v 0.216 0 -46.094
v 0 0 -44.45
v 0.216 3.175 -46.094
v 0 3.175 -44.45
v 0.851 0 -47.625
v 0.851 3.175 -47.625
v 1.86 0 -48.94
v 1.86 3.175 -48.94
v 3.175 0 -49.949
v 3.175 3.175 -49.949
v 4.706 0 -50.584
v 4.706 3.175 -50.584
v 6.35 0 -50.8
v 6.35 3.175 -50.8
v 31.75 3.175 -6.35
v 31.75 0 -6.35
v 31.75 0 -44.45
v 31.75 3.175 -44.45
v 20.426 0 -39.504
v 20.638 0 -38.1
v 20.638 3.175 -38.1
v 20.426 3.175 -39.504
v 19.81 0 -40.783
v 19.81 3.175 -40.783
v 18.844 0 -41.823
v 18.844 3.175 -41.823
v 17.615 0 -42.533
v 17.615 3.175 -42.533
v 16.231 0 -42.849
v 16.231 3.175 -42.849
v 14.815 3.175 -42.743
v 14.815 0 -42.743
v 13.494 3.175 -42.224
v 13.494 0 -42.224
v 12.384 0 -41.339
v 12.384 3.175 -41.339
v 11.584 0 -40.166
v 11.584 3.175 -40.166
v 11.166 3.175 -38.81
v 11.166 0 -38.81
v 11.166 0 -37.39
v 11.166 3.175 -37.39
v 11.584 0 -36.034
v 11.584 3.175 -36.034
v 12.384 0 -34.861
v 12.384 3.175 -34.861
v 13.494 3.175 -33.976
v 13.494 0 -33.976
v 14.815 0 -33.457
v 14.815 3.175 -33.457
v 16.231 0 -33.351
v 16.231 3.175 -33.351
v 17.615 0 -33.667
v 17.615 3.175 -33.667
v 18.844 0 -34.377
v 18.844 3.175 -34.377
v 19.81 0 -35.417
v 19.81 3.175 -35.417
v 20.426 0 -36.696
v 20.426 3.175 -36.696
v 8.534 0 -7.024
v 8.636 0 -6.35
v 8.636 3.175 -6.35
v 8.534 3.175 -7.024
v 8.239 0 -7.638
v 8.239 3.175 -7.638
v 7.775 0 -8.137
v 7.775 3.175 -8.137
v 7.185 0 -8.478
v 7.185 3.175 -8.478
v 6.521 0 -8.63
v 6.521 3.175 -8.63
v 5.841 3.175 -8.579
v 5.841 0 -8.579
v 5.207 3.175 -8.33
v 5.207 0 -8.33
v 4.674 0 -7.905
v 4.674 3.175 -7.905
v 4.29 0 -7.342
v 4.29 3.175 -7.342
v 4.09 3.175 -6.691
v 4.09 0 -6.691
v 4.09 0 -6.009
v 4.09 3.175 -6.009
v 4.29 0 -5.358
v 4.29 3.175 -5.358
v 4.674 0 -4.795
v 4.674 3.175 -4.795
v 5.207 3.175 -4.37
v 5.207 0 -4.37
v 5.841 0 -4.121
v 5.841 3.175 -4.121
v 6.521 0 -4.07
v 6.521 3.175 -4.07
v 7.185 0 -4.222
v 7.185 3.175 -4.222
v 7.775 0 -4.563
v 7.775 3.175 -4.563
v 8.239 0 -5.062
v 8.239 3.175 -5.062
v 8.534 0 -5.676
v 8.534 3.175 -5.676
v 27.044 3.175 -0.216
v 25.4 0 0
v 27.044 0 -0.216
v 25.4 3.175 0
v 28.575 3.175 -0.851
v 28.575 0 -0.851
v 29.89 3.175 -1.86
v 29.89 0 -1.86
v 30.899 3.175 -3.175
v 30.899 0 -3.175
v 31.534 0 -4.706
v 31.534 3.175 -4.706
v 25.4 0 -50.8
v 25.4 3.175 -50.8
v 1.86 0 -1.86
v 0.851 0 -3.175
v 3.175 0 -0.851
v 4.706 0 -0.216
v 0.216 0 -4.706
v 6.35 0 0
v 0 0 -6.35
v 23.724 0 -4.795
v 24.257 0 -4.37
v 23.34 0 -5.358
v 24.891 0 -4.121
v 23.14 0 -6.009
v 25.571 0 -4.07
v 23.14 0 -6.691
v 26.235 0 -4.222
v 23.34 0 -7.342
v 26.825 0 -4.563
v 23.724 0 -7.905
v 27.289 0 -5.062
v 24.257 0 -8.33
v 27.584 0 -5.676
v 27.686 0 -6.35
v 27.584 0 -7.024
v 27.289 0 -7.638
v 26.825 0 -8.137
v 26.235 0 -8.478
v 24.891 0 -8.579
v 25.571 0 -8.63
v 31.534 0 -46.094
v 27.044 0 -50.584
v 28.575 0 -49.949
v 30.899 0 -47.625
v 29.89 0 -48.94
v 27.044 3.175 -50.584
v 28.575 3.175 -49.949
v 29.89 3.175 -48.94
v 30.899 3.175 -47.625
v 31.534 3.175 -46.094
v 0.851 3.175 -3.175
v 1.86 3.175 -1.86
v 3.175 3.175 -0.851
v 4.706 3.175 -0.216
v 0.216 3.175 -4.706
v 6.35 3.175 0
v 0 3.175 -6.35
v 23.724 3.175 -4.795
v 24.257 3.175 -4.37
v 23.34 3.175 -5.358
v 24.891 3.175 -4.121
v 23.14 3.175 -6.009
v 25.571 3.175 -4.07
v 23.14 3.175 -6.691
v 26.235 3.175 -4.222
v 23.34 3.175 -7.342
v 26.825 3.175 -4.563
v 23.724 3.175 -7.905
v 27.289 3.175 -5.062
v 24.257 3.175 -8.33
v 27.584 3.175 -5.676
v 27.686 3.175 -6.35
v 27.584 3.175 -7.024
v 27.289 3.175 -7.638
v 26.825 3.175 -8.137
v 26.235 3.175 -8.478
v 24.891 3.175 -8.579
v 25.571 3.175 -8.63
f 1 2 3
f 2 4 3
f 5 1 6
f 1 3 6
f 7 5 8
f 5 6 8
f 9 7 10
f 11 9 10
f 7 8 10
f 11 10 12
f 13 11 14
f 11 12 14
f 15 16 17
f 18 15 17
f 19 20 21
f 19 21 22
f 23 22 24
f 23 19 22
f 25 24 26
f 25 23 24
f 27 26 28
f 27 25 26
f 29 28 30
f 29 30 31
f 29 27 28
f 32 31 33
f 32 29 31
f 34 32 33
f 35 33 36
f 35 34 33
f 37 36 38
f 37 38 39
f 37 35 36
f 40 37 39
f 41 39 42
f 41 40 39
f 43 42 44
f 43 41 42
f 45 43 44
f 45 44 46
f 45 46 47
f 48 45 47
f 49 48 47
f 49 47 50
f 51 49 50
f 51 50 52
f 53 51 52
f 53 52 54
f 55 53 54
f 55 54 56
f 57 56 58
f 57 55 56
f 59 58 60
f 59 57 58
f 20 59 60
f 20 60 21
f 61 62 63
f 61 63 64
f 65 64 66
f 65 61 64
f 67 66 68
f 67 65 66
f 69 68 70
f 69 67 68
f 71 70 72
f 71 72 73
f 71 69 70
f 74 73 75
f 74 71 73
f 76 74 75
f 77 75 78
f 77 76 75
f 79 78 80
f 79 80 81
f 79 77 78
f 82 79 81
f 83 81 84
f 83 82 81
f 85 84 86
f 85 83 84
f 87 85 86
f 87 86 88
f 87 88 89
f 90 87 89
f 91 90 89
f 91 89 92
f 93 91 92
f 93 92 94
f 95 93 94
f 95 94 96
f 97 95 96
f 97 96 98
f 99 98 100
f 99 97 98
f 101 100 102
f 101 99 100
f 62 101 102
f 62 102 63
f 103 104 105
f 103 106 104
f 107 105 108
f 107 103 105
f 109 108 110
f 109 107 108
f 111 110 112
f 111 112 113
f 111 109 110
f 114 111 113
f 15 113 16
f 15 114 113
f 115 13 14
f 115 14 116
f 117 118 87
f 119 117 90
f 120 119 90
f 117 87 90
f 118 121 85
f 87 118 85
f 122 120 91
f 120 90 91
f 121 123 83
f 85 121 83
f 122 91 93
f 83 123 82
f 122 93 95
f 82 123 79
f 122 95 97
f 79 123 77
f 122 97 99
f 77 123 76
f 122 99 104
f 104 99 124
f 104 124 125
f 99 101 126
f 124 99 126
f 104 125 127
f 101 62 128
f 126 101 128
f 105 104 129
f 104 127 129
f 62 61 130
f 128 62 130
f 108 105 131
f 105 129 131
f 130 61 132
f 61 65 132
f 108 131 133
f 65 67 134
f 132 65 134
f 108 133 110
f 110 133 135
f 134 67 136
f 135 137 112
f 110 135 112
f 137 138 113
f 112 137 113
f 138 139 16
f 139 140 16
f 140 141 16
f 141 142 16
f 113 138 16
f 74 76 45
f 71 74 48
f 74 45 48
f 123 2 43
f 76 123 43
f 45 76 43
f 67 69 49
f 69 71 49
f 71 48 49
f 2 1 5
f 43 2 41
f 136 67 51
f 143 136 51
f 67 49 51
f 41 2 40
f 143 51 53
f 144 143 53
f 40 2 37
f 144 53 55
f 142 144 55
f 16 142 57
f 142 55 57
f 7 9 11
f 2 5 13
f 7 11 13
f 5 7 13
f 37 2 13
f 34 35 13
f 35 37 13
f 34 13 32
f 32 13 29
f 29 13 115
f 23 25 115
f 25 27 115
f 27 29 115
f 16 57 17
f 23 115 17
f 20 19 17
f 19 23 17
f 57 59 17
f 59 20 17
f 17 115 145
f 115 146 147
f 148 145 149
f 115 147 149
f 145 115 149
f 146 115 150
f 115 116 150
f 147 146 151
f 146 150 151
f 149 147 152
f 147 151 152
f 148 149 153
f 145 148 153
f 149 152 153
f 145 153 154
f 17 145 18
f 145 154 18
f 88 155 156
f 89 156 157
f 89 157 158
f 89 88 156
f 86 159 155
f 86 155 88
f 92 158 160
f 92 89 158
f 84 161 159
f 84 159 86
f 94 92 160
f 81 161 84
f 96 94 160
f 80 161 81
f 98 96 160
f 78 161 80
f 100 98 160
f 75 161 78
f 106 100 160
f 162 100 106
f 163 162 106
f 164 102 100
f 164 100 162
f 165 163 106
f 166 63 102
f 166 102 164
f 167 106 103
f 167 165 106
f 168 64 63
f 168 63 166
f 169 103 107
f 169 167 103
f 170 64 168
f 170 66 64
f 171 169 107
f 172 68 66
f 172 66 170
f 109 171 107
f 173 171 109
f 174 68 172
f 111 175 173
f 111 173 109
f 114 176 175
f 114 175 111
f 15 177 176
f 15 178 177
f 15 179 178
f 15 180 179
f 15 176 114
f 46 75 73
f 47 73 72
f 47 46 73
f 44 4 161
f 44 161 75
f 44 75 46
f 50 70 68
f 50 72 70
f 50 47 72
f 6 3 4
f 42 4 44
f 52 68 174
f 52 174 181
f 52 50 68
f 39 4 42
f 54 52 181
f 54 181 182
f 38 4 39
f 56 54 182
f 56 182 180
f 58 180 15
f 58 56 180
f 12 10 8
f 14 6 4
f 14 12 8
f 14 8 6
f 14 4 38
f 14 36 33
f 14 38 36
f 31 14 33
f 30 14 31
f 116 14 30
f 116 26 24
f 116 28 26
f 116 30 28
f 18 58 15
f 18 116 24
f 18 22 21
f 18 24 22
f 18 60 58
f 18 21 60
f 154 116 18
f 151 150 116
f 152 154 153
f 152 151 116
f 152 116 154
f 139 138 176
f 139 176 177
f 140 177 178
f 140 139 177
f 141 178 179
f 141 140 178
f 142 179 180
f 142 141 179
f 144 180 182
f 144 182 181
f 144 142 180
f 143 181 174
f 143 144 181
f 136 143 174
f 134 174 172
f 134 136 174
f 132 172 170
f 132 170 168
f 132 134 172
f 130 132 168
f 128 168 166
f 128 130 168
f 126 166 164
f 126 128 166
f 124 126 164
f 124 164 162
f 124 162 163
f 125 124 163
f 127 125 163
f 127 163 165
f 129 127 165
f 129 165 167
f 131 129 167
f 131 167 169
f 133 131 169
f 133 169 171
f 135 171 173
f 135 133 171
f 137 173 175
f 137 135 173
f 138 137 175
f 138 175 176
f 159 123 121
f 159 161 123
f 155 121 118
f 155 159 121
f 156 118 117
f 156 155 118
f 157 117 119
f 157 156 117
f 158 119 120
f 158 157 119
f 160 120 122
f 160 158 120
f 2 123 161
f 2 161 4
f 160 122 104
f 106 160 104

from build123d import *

# Parameters (mm, degrees)
SKETCH1_W           = 31.75
SKETCH1_H           = 50.8
SKETCH1_R           = 4.7625
SKETCH1_R_2         = 2.286
BOSS_EXTRUDE1_DEPTH = 3.175
FILLET1_R           = 6.35


with BuildPart() as part:
    # Sketch1 → Boss-Extrude1 (new body)
    with BuildSketch(Plane(origin=(0, 0, 0), x_dir=(1, 0, 0), z_dir=(0, 1, 0))):
        with Locations((15.875, 25.4)):
            Rectangle(SKETCH1_W, SKETCH1_H)
        with Locations((15.875, 38.1)):
            Circle(SKETCH1_R, mode=Mode.SUBTRACT)
        with Locations((6.35, 6.35)):
            Circle(SKETCH1_R_2, mode=Mode.SUBTRACT)
        with Locations((25.4, 6.35)):
            Circle(SKETCH1_R_2, mode=Mode.SUBTRACT)
    extrude(amount=BOSS_EXTRUDE1_DEPTH)

    # Fillet1
    fillet1_edges = [part.edges().sort_by_distance(p)[0] for p in [
        (0, 1.5875, -50.8),
        (31.75, 1.5875, -50.8),
        (31.75, 1.5875, 0),
        (0, 1.5875, 0),
    ]]
    fillet(fillet1_edges, radius=FILLET1_R)


solid = part.part
